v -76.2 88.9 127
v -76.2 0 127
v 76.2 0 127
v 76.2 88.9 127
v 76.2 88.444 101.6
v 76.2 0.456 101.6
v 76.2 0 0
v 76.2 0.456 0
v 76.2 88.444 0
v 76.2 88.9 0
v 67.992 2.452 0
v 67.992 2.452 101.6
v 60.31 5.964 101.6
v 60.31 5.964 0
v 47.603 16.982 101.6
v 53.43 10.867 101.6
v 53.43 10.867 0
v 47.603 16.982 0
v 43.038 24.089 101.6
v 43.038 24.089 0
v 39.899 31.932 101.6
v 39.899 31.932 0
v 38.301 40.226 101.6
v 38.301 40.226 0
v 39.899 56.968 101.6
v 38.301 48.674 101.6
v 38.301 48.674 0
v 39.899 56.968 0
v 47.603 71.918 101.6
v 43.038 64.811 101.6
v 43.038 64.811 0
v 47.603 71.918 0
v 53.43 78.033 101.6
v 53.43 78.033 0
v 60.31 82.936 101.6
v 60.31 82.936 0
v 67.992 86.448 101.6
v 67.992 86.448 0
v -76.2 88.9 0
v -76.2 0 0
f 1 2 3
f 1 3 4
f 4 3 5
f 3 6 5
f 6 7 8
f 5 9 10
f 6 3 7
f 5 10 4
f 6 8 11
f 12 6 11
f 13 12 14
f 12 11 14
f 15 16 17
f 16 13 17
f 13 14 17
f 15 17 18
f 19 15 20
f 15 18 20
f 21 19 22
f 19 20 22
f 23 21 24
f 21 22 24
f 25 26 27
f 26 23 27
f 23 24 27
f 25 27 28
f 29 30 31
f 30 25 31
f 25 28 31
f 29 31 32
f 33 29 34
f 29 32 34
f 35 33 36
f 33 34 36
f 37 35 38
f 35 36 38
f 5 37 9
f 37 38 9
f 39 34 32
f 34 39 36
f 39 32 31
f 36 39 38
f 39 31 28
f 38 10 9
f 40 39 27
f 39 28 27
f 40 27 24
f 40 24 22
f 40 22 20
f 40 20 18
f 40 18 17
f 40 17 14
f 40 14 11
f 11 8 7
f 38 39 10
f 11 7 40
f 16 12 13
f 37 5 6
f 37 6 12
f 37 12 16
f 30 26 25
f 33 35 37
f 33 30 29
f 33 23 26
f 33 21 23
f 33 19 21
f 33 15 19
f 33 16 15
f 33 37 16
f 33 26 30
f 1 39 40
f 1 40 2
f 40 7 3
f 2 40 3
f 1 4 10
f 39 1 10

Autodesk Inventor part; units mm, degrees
ref_plane "YZ Plane" through (0, 0, 0) normal (1, 0, 0) x (0, 1, 0)
ref_plane "XZ Plane" through (0, 0, 0) normal (0, 1, 0) x (-1, 0, 0)
ref_plane "XY Plane" through (0, 0, 0) normal (0, 0, 1) x (1, 0, 0)
sketch "Sketch1" plane through (0, 0, 0) normal (0, 0, 1) x (1, 0, 0)
  line L0 (0, 0) -> (76.2, 0)
  line L1 (76.2, 0) -> (76.2, 88.9)
  line L2 (76.2, 88.9) -> (0, 88.9)
  line L3 (0, 88.9) -> (0, 0)
  dimension "d0" = 76.2
  dimension "d1" = 88.9
extrude "Extrusion1" add sketch "Sketch1" along normal blind 127
sketch "Sketch3" plane through (0, 0, 0) normal (0, 0, -1) x (-1, 0, 0)
  circle A0 centre (-82.55, 44.45) radius 44.45
  dimension "d4" = 88.9
extrude "Extrusion2" cut sketch "Sketch3" against normal blind 101.6
sketch "Sketch4" plane through (0, 0, 0) normal (-1, 0, 0) x (0, 0, 1)
  line L0 (0, 0) -> (127, 0)
  line L1 (127, 0) -> (127, 88.9)
  line L2 (127, 88.9) -> (0, 88.9)
  line L3 (0, 88.9) -> (0, 0)
extrude "Extrusion3" add sketch "Sketch4" along normal blind 76.2
sketch "Sketch5" plane through (76.2, 0, 0) normal (0, -1, 0) x (1, 0, 0)
  line L0 (-152.4, 0) -> (0, 0) projected
  line L1 (0, 0) -> (0, 127) projected
  line L2 (0, 127) -> (-152.4, 127) projected
  line L3 (-152.4, 0) -> (-152.4, 127) projected
  line L4 (0, 63.5) -> (-88.9, 63.5)
  point P0 (-76.2, 0)
  dimension "d9" = 88.9
sketch "Sketch6" plane through (76.2, 88.9, 127) normal (0, 1, 0) x (1, 0, 0)
  line L0 (0, 127) -> (-152.4, 127) projected
  line L1 (-152.4, 0) -> (-152.4, 127) projected
  line L2 (0, 0) -> (-152.4, 0) projected
  line L3 (0, 127) -> (0, 0) projected
  line L4 (0, 127) -> (0, 63.5)
  line L5 (0, 63.5) -> (-88.9, 63.5)
  point P0 (-76.2, 127)
  dimension "d10" = 63.5
  dimension "d11" = 88.9
properties part number "Holder"
